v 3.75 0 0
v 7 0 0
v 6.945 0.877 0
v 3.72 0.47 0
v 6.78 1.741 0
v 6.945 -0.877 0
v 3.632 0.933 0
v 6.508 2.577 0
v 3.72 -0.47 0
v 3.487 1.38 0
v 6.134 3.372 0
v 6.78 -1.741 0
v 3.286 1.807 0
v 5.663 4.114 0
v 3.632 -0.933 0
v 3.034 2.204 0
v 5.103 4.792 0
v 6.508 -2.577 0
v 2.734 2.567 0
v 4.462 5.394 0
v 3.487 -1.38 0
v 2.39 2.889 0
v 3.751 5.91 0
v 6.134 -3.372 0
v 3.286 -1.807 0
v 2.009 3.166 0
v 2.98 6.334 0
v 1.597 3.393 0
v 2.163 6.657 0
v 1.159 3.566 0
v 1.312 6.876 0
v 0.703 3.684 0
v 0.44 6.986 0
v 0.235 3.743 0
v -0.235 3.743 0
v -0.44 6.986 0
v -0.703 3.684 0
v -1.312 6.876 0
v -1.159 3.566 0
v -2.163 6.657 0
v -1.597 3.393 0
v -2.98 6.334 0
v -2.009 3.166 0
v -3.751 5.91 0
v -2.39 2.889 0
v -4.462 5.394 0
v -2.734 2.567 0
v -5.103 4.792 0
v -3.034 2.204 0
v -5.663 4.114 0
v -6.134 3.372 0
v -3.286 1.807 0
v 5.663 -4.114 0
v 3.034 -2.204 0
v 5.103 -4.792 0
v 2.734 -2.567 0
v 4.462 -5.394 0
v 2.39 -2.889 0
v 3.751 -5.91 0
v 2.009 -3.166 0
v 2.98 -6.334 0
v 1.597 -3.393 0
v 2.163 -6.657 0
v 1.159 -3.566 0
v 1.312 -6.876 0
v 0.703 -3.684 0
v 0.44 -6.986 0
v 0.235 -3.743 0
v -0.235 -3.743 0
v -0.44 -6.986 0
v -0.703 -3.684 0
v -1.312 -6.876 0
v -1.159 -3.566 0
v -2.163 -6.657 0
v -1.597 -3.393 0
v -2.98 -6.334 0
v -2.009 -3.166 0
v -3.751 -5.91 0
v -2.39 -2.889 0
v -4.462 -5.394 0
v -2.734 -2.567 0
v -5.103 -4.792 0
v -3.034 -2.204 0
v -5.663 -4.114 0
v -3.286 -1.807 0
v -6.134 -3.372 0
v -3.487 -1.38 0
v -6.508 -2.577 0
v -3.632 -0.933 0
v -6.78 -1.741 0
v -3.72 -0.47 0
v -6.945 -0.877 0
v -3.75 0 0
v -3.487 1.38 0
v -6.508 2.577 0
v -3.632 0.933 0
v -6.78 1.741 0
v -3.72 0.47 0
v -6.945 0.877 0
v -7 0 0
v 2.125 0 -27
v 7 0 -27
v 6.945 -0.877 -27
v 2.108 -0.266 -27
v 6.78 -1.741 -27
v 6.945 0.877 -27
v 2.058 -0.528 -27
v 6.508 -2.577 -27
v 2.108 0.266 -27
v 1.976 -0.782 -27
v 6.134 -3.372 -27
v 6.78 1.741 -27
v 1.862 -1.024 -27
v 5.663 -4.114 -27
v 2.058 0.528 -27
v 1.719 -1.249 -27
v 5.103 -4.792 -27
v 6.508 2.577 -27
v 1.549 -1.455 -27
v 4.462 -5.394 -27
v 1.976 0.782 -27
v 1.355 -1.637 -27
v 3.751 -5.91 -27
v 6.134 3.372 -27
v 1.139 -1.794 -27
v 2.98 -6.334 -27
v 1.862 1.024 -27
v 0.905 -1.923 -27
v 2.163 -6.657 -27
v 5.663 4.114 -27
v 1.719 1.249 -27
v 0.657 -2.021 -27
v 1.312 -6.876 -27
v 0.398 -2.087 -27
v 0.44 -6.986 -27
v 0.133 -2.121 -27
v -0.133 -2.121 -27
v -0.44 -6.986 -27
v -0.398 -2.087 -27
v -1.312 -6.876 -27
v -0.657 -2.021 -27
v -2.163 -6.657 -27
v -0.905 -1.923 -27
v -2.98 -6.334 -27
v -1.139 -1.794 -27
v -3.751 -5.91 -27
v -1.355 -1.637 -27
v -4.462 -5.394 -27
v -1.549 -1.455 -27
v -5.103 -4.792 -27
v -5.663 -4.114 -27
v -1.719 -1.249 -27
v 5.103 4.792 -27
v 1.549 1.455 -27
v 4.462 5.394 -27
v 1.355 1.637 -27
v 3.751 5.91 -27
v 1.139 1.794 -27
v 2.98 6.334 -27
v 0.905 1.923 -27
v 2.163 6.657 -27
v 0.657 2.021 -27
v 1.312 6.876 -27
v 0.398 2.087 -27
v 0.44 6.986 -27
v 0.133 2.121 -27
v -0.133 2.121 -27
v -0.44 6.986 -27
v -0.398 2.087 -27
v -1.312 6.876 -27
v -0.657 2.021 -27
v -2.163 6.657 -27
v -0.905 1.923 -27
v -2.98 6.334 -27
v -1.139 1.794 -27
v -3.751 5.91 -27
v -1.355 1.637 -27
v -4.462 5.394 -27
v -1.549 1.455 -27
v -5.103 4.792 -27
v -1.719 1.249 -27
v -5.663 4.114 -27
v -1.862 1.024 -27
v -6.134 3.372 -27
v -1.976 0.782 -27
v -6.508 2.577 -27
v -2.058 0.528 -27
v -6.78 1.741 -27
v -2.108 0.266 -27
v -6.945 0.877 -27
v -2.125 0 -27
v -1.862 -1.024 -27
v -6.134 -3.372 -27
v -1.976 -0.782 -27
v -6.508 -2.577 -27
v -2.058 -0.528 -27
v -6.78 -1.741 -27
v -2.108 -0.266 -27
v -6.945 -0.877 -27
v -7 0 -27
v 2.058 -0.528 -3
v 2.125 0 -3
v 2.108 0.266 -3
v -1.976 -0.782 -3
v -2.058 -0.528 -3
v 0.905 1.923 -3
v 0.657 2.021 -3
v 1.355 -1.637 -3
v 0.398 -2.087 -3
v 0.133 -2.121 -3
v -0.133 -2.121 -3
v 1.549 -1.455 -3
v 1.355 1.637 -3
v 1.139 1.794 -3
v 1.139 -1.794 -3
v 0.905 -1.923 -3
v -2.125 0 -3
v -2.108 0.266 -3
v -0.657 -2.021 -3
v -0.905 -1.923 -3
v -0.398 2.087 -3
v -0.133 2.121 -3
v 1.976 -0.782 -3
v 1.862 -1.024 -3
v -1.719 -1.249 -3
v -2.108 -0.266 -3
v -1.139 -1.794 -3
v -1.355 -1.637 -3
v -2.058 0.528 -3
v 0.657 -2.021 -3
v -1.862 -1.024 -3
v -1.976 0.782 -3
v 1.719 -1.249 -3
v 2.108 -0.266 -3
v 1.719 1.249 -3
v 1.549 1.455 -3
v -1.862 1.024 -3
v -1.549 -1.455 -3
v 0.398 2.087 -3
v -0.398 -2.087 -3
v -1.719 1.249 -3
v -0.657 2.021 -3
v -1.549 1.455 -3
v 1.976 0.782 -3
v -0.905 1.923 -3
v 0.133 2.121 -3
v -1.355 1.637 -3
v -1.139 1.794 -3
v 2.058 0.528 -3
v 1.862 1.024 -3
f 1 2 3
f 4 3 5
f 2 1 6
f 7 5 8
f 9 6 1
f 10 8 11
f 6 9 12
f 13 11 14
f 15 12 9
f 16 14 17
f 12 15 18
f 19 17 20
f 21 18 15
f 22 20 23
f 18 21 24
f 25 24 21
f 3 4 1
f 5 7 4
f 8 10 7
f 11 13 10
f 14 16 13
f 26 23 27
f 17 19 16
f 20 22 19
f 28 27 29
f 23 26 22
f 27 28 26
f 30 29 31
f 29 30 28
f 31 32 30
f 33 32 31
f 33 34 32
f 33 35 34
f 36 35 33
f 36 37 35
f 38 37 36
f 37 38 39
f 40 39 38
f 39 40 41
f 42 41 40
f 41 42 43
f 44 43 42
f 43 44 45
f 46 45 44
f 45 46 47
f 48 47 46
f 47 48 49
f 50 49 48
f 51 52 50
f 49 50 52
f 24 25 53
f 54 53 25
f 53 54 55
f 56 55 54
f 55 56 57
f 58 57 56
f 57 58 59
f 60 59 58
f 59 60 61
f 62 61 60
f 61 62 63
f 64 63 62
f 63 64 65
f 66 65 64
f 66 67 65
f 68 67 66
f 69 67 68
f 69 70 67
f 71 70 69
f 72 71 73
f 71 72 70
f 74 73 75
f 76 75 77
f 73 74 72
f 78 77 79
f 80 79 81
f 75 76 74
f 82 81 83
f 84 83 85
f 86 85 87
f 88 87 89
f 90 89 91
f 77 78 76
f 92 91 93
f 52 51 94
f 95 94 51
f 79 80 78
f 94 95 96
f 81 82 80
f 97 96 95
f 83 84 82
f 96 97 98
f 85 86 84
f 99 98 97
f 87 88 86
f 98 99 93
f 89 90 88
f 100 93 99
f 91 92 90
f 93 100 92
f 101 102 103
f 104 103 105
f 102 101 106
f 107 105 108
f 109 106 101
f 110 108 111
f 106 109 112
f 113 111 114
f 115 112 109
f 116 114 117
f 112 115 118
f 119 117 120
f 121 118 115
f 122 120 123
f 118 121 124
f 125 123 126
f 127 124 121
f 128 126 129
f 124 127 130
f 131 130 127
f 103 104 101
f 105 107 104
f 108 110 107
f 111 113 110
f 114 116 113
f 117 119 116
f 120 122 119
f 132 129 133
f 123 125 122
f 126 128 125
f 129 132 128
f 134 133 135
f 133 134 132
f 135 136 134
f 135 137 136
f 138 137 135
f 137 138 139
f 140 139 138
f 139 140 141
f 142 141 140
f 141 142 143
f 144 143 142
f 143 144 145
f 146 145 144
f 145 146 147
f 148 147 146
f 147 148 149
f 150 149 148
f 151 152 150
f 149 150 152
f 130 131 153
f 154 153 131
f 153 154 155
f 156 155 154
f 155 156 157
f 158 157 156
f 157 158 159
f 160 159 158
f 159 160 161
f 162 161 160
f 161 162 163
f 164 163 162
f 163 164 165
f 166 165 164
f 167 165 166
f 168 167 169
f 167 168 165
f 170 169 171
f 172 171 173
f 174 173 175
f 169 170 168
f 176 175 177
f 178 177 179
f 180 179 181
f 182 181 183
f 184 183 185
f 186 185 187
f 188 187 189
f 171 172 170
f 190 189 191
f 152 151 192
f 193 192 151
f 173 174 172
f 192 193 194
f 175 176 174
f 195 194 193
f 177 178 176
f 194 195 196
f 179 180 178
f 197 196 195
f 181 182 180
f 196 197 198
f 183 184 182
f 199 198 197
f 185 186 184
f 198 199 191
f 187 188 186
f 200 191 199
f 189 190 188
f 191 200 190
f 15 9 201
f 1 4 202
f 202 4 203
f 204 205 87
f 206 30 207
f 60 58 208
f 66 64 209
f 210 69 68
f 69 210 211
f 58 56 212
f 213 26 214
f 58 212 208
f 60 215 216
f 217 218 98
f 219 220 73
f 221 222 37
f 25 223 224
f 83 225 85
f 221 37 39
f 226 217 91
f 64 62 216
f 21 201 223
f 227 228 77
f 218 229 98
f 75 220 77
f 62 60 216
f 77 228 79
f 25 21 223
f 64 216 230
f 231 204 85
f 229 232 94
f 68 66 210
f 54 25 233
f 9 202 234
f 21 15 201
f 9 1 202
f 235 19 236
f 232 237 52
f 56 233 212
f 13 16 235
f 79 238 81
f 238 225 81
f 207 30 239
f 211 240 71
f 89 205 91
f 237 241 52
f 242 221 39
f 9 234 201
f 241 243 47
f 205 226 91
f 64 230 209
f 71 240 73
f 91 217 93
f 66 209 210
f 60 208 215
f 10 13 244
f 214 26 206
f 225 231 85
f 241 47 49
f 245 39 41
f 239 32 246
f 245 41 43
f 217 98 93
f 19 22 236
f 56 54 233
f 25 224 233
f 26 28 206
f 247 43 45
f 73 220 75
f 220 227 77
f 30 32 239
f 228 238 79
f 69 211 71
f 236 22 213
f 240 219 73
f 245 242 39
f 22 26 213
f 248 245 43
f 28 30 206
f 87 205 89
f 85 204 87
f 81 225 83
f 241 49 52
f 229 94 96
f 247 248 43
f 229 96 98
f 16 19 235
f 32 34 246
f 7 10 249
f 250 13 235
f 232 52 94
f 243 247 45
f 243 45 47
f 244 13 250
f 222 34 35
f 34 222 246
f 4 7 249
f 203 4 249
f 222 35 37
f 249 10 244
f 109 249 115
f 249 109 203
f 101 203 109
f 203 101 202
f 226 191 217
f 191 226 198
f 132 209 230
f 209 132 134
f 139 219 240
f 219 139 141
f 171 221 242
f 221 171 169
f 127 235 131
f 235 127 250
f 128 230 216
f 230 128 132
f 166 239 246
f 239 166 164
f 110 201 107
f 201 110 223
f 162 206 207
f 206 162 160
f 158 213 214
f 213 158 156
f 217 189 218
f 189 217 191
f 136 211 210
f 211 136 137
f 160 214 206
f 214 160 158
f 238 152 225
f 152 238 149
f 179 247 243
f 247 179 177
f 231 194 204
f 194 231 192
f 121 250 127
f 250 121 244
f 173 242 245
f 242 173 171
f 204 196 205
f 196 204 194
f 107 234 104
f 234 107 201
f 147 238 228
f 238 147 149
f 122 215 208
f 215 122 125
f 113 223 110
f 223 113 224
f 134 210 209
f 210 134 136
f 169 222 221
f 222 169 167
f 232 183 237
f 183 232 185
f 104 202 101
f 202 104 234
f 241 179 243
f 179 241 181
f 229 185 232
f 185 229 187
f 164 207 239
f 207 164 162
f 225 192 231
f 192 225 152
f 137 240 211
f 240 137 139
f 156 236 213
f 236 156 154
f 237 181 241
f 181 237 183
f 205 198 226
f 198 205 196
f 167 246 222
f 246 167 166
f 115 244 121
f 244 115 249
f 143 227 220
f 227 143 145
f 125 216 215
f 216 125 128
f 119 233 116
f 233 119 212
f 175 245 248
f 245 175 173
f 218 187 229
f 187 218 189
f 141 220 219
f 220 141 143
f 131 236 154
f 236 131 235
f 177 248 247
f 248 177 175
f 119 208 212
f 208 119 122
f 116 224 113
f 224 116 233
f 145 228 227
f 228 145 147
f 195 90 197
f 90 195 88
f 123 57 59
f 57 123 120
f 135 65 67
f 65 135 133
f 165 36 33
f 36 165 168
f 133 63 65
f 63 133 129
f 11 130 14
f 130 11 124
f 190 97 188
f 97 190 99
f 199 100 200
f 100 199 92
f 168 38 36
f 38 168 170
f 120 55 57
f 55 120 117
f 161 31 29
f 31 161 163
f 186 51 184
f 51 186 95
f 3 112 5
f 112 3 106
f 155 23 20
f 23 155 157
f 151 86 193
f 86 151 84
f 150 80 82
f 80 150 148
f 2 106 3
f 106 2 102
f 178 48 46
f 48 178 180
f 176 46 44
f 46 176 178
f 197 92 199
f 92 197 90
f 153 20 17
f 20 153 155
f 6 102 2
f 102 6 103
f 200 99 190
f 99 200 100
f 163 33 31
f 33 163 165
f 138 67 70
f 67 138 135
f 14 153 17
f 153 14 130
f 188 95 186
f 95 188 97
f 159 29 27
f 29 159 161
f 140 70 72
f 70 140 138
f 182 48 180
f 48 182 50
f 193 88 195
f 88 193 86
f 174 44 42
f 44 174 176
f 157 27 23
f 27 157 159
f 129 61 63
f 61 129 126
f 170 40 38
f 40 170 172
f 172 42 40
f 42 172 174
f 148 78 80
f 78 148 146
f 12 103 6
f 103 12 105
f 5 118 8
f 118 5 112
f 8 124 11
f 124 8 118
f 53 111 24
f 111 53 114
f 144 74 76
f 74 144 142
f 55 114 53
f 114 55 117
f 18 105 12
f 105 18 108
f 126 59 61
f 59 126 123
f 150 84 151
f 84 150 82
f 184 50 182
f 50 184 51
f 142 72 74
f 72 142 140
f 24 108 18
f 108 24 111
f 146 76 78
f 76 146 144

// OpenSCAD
$fn = 50;


difference() {
	union() {
		translate(v = [0, 0, -27.0000000000]) {
			cylinder(h = 27, r = 7.0000000000);
		}
		cylinder(h = 0, r = 16.0000000000);
	}
	union() {
		translate(v = [0, 0, 0]) {
			rotate(a = [0, 0, 0]) {
				difference() {
					union() {
						#translate(v = [0, 0, -27.0000000000]) {
							cylinder(h = 27, r = 2.0000000000);
						}
						#translate(v = [0, 0, -3]) {
							cylinder(h = 3, r1 = 2.1250000000, r2 = 3.7500000000);
						}
						#translate(v = [0, 0, -27.0000000000]) {
							cylinder(h = 27, r = 2.1250000000);
						}
						#translate(v = [0, 0, -27.0000000000]) {
							cylinder(h = 27, r = 2.0000000000);
						}
					}
					union();
				}
			}
		}
	}
}
